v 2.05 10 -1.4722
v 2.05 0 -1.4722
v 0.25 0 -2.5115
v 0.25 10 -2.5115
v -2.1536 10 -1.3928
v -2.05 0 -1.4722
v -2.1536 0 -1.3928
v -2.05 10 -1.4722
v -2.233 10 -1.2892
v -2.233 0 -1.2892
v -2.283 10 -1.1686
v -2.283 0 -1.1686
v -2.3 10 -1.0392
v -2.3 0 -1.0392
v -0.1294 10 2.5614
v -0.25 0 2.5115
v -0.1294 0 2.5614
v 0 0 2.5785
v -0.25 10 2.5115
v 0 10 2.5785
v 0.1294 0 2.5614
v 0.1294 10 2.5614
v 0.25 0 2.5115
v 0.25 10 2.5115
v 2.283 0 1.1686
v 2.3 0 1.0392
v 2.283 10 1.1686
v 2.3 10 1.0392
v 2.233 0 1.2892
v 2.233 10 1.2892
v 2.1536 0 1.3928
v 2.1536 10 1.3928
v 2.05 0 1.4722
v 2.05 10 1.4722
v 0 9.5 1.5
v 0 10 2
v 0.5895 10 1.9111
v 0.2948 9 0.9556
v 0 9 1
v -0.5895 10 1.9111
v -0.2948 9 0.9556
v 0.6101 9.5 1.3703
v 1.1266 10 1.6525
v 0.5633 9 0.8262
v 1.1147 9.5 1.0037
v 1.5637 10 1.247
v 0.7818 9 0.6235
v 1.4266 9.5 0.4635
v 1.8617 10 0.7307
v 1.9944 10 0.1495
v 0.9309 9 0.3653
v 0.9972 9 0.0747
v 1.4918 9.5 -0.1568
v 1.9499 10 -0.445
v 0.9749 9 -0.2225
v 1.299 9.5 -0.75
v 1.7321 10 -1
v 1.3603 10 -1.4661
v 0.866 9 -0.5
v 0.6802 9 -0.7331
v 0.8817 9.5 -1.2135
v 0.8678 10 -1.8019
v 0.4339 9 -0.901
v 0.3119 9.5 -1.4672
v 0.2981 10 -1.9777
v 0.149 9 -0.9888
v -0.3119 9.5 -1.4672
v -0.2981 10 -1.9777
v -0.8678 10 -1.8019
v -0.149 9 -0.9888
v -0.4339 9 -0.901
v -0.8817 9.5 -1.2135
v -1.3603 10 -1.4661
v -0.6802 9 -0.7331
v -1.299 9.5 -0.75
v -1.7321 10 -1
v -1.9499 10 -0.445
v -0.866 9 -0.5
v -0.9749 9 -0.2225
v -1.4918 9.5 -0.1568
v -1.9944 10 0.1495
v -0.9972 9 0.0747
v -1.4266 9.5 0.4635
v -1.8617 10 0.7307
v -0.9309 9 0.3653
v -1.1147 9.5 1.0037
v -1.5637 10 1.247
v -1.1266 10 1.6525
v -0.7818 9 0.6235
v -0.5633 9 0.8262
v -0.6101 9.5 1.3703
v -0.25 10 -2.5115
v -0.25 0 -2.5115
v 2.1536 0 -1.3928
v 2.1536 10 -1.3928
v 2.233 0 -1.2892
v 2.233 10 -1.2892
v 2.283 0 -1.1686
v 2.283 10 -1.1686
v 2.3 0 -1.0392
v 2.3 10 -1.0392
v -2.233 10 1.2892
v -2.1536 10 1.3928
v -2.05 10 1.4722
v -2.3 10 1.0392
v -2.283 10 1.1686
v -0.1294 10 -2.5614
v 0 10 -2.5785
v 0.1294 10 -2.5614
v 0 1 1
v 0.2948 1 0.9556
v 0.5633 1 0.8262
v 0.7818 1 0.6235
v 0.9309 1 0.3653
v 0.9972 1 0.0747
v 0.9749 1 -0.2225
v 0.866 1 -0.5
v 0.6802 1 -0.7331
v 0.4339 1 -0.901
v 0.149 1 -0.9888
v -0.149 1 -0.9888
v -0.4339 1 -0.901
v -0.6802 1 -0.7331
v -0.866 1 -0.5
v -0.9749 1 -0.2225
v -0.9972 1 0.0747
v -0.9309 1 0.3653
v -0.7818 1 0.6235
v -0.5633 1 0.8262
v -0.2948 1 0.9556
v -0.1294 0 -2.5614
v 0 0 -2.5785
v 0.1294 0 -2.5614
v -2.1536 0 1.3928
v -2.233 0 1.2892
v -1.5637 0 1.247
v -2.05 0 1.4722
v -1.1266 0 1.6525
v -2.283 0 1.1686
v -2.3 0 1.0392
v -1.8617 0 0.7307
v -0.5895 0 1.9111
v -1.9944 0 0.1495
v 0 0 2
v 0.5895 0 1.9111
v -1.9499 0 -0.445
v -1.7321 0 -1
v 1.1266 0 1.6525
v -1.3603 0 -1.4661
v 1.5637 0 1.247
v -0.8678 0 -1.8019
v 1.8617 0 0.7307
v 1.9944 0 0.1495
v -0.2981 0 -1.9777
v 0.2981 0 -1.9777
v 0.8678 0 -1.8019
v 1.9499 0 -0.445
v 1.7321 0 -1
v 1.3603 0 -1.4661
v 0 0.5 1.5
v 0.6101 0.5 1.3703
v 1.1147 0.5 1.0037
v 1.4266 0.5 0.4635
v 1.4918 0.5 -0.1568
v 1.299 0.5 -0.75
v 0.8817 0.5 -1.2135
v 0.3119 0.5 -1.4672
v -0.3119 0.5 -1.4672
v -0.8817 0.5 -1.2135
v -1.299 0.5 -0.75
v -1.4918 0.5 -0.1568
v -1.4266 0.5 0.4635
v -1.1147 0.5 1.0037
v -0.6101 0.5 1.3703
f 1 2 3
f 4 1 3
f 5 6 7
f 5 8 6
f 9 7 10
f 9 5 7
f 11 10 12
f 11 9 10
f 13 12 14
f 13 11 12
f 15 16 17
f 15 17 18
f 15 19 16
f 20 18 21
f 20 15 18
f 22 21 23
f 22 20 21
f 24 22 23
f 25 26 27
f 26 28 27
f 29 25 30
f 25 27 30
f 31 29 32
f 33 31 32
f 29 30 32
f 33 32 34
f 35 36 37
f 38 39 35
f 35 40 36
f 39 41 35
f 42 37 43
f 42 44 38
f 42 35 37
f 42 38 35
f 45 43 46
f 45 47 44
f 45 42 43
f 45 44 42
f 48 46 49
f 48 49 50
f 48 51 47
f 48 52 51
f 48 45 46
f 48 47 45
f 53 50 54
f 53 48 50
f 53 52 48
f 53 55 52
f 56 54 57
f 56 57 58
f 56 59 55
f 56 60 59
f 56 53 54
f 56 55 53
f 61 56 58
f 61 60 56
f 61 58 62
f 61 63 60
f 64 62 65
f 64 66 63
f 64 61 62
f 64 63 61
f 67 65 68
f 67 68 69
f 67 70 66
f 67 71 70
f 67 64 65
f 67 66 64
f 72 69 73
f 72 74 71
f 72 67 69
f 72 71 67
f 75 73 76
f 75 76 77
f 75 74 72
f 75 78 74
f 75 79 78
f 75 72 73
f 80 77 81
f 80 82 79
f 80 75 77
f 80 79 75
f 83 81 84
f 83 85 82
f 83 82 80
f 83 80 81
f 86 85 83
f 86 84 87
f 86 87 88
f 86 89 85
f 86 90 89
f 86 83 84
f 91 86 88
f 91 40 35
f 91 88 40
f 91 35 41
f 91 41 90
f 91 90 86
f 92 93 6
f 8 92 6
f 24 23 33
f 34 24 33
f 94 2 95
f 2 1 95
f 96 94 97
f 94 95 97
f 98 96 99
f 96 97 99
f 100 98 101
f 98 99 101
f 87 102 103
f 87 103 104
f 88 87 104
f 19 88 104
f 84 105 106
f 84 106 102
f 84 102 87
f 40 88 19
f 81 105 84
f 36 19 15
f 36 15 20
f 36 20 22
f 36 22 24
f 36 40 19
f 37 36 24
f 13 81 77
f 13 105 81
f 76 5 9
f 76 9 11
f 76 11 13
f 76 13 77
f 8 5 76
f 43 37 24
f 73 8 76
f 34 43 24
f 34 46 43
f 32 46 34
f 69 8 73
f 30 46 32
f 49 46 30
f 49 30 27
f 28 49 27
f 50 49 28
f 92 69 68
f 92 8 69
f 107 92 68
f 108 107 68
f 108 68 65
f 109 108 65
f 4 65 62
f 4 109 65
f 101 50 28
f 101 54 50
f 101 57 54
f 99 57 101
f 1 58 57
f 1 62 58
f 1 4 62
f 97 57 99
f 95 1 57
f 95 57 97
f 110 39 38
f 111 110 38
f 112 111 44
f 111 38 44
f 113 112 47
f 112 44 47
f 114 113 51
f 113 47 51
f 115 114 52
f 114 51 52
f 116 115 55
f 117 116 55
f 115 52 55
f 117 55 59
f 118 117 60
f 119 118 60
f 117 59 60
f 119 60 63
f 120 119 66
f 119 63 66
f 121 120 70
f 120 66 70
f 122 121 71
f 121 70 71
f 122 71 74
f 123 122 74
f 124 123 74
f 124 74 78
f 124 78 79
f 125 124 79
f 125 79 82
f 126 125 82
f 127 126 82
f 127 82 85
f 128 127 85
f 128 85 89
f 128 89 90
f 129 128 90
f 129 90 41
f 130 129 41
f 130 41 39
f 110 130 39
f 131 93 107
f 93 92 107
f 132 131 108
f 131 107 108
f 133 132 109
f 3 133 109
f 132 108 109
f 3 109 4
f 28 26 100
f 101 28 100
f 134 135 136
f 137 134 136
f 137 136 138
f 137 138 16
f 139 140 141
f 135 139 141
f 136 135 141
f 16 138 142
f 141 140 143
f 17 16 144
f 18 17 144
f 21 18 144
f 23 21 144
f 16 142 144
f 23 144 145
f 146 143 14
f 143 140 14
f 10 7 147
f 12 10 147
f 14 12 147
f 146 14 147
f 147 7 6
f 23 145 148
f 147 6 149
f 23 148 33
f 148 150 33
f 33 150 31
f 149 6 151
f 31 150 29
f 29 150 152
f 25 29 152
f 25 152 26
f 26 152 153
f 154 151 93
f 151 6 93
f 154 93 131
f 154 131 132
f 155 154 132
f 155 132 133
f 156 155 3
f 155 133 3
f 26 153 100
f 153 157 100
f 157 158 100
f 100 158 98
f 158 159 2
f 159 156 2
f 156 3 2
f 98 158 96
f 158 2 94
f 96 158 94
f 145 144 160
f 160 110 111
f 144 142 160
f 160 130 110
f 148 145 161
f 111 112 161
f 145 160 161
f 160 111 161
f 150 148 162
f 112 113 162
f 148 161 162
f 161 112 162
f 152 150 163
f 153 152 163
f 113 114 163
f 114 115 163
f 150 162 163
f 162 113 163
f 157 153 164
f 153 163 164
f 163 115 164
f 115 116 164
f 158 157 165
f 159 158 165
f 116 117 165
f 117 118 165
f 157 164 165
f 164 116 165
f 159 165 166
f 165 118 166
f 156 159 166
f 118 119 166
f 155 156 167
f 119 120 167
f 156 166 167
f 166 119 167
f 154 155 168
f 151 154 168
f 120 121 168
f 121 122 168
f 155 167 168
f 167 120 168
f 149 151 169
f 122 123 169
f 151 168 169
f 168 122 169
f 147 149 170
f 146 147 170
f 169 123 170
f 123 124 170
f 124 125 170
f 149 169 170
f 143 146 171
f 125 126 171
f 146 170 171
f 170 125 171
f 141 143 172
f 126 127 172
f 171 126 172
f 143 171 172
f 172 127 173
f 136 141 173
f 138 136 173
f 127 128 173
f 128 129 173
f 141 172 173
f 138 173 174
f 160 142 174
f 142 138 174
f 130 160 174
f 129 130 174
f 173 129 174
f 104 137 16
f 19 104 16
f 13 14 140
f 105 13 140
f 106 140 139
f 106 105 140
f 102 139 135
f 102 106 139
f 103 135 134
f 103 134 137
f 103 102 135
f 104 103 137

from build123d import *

# Parameters (mm, degrees)
BOSS_EXTRUDE1_DEPTH = 10
SKETCH2_R           = 1
CUT_EXTRUDE1_DEPTH  = 11.599213807
CHAMFER2_SIZE       = 1
FILLET1_R           = 0.5


with BuildPart() as part:
    # Sketch1 → Boss-Extrude1 (new body)
    with BuildSketch(Plane(origin=(0, 0, 0), x_dir=(1, 0, 0), z_dir=(0, 1, 0))):
        Polygon((0, 2.655811238), (-2.3, 1.327905619), (-2.3, -1.327905619), (0, -2.655811238), (2.3, -1.327905619), (2.3, 1.327905619), align=None)
    extrude(amount=BOSS_EXTRUDE1_DEPTH)

    # Sketch2 → Cut-Extrude1 (cut, through all)
    with BuildSketch(Plane(origin=(0, 10, 0), x_dir=(1, 0, 0), z_dir=(0, 1, 0))):
        with Locations(Location((0, 0, 0), (0, 0, 270))):
            Circle(SKETCH2_R)
    extrude(amount=-CUT_EXTRUDE1_DEPTH, mode=Mode.SUBTRACT)

    # Chamfer2
    chamfer2_edges = [part.edges().sort_by_distance(p)[0] for p in [
        (0, 0, -1),
        (0, 10, -1),
    ]]
    chamfer(chamfer2_edges, length=CHAMFER2_SIZE)

    # Fillet1
    fillet1_edges = [part.edges().sort_by_distance(p)[0] for p in [
        (2.3, 5, -1.327905619),
        (2.3, 5, 1.327905619),
        (0, 5, 2.655811238),
        (-2.3, 5, 1.327905619),
        (-2.3, 5, -1.327905619),
        (0, 5, -2.655811238),
    ]]
    fillet(fillet1_edges, radius=FILLET1_R)


solid = part.part
